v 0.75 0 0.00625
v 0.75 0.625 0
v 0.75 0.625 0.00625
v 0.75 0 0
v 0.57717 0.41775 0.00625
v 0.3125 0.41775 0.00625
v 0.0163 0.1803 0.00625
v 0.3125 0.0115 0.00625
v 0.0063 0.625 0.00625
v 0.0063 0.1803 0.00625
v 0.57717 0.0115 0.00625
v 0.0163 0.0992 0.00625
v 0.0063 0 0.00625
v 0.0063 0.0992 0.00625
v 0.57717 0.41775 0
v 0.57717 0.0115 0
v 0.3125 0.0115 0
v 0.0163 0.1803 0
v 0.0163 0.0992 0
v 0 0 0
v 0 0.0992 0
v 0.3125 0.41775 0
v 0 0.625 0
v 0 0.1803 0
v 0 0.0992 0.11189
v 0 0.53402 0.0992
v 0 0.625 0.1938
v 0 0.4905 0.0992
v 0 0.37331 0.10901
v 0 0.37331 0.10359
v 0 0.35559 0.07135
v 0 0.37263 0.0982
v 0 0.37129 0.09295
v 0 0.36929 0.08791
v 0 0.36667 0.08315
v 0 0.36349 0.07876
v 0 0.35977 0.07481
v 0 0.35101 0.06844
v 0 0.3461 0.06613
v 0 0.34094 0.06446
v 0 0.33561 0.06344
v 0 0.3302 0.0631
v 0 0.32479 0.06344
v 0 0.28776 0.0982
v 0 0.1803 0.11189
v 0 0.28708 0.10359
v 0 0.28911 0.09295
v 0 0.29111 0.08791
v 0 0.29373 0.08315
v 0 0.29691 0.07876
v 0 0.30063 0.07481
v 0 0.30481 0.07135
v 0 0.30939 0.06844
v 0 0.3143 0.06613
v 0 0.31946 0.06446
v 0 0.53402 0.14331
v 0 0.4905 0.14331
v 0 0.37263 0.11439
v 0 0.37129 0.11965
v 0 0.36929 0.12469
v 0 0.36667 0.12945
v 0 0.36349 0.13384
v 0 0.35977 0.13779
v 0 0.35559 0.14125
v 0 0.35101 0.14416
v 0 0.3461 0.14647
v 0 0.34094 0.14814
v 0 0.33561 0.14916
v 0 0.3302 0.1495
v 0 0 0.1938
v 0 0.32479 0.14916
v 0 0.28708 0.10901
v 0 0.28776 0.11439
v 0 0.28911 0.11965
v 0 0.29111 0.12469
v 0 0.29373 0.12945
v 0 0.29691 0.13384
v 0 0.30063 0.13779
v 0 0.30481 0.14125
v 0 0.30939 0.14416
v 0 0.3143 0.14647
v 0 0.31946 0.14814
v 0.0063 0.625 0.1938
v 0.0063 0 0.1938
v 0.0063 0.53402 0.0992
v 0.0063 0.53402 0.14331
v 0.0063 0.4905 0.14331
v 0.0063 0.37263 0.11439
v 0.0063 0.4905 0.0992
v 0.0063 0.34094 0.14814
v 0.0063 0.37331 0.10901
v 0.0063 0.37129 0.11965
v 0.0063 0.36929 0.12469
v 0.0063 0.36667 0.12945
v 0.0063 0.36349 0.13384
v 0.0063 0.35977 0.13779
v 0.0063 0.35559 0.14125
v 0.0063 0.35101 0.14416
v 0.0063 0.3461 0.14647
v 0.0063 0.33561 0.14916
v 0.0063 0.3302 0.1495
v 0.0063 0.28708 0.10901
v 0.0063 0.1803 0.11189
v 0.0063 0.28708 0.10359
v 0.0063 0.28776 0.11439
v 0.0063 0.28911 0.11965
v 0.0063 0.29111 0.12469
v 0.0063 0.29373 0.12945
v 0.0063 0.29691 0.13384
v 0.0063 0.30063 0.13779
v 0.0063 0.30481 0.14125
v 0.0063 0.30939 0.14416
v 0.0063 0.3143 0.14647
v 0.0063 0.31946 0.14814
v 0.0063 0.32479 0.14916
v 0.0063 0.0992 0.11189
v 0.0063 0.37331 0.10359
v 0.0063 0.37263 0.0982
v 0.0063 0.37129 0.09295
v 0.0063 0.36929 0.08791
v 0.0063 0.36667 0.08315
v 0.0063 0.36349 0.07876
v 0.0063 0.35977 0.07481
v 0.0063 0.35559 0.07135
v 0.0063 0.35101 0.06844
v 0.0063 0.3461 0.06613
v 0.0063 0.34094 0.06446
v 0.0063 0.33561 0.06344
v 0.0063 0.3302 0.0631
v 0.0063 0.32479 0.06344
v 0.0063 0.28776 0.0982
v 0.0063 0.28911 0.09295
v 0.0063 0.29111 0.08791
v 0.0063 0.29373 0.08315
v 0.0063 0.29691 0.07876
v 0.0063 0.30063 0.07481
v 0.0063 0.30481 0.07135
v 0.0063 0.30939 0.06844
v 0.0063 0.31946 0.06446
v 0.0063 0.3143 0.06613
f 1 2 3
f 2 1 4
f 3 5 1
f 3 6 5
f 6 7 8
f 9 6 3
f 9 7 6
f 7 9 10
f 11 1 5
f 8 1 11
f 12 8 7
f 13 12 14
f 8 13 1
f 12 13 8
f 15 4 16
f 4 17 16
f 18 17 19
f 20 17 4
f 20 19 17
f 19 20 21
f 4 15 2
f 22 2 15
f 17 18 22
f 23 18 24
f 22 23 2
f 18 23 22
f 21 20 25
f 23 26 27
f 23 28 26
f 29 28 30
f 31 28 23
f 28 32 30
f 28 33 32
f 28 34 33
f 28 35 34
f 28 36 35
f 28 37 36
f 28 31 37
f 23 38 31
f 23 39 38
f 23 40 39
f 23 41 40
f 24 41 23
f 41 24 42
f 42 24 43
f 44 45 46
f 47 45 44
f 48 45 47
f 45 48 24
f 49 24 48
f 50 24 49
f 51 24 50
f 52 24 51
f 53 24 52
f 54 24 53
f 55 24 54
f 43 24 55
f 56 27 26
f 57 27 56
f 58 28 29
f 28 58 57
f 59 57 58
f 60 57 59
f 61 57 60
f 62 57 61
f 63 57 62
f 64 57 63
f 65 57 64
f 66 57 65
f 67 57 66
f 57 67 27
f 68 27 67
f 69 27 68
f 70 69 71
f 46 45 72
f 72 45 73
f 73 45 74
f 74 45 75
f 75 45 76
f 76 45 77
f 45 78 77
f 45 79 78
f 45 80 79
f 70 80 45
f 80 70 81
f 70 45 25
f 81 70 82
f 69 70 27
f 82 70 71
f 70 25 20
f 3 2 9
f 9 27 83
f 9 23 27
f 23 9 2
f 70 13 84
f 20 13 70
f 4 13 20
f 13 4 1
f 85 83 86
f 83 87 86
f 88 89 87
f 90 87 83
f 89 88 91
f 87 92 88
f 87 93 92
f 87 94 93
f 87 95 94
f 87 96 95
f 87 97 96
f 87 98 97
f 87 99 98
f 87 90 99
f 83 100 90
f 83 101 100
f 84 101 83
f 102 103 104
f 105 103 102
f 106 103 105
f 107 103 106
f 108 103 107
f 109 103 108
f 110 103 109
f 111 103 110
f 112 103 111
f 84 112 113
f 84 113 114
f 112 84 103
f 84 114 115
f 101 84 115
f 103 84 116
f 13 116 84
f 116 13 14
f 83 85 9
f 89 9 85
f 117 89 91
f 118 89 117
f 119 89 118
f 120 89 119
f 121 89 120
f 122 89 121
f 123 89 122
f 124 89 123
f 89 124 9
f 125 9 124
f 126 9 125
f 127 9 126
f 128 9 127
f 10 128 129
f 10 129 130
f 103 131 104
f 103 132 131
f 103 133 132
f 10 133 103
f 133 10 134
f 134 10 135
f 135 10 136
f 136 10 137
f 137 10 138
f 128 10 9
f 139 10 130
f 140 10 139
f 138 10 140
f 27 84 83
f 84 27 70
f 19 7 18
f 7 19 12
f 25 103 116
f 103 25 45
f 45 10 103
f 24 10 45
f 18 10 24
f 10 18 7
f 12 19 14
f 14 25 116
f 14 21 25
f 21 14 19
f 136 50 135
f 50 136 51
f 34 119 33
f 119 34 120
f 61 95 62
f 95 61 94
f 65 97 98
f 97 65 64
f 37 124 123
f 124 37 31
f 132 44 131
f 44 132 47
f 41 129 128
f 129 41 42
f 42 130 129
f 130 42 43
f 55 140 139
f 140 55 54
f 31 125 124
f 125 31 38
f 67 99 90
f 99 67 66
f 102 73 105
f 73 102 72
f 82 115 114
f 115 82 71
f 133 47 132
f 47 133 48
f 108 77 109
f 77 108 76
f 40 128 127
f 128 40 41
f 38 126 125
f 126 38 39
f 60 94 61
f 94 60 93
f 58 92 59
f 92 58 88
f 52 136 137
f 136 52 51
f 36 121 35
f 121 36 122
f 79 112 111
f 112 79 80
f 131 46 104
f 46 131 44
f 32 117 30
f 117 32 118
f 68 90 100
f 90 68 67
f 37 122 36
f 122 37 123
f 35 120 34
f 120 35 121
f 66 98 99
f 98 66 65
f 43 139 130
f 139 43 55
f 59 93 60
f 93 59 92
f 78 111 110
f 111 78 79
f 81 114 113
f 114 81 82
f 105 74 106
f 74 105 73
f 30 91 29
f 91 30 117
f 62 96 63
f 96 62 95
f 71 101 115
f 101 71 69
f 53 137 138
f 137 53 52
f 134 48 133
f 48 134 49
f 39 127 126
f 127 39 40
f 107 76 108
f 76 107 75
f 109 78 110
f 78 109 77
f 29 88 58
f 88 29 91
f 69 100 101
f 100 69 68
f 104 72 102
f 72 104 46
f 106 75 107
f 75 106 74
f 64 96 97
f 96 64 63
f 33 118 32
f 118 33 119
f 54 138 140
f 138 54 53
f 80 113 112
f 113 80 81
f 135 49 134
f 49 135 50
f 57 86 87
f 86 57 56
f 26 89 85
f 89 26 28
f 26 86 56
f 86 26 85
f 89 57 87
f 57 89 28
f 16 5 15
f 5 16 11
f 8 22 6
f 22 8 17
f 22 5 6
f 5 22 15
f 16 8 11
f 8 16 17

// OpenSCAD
// Global Settings
$fn = 50; // Smoothness for curved surfaces

// Base Plate Dimensions
base_length = 0.75;       // X-axis length
base_width = 0.625;       // Y-axis (front-back) width
base_height = 0.00625;    // Z-axis height from base datum (z=0 underside)

// Left Upright Wall Dimensions
wall_thickness = 0.0063;  // X-axis thickness
wall_total_height = 0.1938; // Total Z height from base datum

// Cut 1: Lower Wall Rectangular Opening
cut1_y_length = 0.081103;
cut1_z_height = 0.111891;
cut1_y_back_offset = 0.0992;
cut1_z_min = 0;
cut1_z_max = 0.1119;

// Cut 2: Wall Circular Through Hole
hole_radius = 0.0432;
hole_front_offset_y = 0.2948;
hole_z_min = 0.0631;
hole_z_max = 0.1495;
hole_cut_depth = 0.0625;

// Cut 3: Small Upper Wall Rectangular Opening
cut2_y_length = 0.043521;
cut2_z_height = 0.044108;
cut2_y_back_offset = 0.4905;
cut2_z_min = 0.0992;
cut2_z_max = 0.1433;

// Cut 4: Base Plate Through Opening
base_cut_x_length = 0.264669;
base_cut_y_length = 0.40625;
base_cut_x_left_offset = 0.3125;
base_cut_y_back_offset = 0.0115;
base_cut_z_min = -0.0562;
base_cut_z_max = 0.0063;

// Module: Base Plate
module base_plate() {
    cube([base_length, base_width, base_height], center=false);
}

// Module: Left Upright Wall
module left_wall() {
    translate([0, 0, 0])
        cube([wall_thickness, base_width, wall_total_height], center=false);
}

// Main Model Assembly
difference() {
    // Combine base and wall
    union() {
        base_plate();
        left_wall();
    }
    
    // Cut 1: Lower wall rectangle
    translate([-0.01, cut1_y_back_offset, cut1_z_min])
        cube([wall_thickness + 0.02, cut1_y_length, cut1_z_height], center=false);
    
    // Cut 2: Circular wall hole
    translate([0, base_width - hole_front_offset_y, (hole_z_min + hole_z_max)/2])
        rotate([0, 90, 0]) // Rotate cylinder to cut along X-axis through wall
            cylinder(h=hole_cut_depth, r=hole_radius, center=true);
    
    // Cut 3: Small upper wall rectangle
    translate([-0.01, cut2_y_back_offset, cut2_z_min])
        cube([wall_thickness + 0.06, cut2_y_length, cut2_z_height], center=false);
    
    // Cut 4: Base plate through opening
    translate([base_cut_x_left_offset, base_cut_y_back_offset, base_cut_z_min])
        cube([base_cut_x_length, base_cut_y_length, base_cut_z_max - base_cut_z_min], center=false);
}
